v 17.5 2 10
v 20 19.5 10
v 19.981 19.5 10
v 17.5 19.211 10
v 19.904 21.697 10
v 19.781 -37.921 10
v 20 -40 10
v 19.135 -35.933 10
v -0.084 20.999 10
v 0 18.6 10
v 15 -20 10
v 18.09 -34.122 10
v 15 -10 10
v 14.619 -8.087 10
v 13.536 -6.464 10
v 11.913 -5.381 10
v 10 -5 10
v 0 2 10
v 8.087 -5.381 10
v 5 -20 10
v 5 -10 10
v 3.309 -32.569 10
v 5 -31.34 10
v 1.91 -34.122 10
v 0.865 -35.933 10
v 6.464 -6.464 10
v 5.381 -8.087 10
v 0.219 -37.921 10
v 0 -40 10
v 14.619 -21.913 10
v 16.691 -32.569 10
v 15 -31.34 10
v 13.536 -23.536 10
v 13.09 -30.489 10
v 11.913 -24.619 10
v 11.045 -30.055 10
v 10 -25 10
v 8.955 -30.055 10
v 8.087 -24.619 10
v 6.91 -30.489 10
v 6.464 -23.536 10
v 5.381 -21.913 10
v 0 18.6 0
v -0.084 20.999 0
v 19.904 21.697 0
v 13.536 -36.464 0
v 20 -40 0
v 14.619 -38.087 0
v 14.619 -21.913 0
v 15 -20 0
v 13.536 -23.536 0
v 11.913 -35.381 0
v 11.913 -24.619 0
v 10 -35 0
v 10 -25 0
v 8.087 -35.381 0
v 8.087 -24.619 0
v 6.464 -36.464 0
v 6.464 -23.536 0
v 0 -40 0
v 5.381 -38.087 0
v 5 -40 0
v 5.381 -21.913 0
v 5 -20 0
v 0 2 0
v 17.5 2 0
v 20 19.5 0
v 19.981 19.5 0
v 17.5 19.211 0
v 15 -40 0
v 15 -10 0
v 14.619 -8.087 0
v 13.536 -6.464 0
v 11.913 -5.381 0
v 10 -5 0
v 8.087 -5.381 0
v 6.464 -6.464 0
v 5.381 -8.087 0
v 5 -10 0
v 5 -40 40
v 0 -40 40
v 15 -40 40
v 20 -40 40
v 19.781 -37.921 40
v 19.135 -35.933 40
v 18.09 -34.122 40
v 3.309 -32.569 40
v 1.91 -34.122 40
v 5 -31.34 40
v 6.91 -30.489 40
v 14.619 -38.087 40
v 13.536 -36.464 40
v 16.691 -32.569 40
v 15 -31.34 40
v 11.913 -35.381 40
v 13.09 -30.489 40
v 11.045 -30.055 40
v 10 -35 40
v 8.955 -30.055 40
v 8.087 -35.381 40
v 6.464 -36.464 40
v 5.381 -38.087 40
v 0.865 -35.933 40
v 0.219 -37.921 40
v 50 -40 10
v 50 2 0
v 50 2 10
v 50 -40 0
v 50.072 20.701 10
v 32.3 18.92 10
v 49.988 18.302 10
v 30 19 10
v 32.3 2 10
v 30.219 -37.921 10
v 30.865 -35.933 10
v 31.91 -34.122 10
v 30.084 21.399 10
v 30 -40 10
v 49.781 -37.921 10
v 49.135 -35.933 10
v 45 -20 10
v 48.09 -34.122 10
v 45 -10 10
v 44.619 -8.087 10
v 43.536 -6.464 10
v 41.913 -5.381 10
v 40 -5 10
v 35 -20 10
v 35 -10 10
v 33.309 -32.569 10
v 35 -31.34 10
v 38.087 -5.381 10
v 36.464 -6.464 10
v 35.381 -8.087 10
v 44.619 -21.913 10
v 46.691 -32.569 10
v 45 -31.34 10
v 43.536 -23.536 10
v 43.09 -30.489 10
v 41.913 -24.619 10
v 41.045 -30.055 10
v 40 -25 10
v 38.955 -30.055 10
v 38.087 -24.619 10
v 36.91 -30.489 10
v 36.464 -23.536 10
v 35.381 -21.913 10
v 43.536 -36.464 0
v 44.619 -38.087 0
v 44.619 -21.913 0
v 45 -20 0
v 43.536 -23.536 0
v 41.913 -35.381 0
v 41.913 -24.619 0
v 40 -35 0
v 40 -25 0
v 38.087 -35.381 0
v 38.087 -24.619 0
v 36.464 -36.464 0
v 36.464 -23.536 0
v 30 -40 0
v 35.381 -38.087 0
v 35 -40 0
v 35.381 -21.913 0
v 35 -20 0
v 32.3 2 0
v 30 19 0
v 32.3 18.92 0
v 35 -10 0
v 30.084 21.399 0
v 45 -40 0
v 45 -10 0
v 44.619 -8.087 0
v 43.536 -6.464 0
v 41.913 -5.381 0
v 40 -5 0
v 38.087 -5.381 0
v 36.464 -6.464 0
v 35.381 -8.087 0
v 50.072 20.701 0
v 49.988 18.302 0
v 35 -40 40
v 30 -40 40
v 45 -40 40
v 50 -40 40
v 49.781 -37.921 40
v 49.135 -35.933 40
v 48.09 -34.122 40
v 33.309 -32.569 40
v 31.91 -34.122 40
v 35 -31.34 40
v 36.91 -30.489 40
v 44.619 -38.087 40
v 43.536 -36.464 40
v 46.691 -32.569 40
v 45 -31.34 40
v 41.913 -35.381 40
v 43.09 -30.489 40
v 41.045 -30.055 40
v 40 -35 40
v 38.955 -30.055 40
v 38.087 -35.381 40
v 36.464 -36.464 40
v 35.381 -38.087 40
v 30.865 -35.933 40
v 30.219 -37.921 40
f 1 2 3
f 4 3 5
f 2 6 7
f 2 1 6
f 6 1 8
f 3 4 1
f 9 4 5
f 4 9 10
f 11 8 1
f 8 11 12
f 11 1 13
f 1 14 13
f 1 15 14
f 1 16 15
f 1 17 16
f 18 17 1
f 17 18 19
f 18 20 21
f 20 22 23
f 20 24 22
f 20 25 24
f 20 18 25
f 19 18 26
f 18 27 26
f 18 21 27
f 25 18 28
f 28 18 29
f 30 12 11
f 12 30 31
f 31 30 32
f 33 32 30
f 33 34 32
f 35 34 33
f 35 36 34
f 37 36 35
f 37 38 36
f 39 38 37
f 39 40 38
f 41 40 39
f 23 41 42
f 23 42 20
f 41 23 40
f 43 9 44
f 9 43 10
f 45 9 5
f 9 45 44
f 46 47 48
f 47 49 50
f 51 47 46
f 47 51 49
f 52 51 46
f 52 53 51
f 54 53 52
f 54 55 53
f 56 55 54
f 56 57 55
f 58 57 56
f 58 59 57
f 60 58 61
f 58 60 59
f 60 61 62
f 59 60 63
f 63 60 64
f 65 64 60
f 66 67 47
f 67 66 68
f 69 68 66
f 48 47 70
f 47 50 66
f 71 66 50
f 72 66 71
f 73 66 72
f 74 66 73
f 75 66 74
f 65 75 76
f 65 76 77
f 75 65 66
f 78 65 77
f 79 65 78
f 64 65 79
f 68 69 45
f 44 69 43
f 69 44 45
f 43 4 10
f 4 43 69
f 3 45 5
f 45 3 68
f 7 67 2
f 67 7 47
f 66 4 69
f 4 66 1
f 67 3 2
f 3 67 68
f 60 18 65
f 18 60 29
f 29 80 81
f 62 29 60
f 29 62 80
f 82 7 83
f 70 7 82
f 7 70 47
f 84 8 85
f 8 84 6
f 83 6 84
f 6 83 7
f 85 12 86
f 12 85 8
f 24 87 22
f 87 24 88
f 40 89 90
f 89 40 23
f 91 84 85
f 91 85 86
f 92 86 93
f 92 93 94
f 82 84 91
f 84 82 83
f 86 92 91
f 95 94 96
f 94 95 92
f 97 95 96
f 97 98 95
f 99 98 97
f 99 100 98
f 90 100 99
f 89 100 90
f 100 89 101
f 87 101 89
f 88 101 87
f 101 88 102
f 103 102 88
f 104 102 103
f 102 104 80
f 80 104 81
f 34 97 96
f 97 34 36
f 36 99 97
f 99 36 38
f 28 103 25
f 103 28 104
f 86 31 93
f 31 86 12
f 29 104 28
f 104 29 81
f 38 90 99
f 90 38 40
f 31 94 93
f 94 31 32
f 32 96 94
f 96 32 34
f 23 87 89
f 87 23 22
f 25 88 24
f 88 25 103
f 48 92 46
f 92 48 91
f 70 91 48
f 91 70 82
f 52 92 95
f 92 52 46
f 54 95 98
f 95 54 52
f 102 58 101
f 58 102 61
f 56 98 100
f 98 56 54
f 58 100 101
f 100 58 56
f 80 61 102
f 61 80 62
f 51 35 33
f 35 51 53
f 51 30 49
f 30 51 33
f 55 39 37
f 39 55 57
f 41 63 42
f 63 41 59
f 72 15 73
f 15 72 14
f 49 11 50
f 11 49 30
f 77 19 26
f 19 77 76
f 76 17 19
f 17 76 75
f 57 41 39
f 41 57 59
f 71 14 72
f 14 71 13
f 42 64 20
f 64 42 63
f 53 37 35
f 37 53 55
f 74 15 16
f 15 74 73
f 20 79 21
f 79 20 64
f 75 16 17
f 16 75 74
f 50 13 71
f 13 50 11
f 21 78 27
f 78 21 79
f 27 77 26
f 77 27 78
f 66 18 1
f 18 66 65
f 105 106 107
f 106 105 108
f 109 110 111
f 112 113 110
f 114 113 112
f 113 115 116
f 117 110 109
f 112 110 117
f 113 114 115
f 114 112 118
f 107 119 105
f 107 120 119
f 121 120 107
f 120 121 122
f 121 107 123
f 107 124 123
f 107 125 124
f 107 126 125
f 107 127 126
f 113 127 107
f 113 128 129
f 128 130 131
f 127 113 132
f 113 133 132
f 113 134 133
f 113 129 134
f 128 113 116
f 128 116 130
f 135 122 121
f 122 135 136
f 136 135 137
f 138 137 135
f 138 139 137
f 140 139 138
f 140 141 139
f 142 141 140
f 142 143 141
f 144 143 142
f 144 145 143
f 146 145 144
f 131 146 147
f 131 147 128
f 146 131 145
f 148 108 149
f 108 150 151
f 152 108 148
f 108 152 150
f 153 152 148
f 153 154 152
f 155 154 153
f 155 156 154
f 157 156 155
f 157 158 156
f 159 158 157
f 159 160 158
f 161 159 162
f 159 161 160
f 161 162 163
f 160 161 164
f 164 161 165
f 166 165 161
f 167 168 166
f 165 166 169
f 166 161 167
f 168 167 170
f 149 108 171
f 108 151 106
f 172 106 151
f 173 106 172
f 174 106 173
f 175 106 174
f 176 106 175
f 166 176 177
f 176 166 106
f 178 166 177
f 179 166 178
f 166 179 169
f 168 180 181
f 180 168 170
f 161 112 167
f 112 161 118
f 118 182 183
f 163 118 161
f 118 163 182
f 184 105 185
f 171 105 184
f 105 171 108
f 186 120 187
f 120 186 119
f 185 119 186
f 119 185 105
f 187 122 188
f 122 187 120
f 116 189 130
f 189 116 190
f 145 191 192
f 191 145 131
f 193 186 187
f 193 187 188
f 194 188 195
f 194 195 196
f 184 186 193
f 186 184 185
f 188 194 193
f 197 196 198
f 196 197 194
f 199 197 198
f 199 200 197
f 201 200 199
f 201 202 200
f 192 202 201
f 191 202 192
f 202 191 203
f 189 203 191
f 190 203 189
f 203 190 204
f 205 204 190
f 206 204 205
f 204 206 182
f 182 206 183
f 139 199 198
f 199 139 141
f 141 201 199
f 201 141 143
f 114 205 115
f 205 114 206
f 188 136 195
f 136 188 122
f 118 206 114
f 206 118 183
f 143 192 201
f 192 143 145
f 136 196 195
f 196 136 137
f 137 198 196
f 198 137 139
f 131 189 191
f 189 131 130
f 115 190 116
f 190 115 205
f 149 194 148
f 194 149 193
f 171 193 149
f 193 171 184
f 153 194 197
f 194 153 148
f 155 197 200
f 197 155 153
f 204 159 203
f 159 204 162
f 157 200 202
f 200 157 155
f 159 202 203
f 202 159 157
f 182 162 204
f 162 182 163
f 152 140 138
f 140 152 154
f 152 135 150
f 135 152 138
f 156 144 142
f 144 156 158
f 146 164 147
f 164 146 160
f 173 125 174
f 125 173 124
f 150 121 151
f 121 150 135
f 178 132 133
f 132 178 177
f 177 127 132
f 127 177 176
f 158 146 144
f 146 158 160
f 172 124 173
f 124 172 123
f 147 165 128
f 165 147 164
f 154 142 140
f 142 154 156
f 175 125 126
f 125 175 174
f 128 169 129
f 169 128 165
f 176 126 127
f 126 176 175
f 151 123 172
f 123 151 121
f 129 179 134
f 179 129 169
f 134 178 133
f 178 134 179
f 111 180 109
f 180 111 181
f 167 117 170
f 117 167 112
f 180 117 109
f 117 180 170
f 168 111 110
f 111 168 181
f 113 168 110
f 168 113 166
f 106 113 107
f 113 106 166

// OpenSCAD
/* [Global] */

// width of holder
width = 10;

// inner height of clamp (should be the height of the board you want to attach it to)
clamp_inner_height = 17;

// length of the round part that goes into the roll
roll_holder_length = 30;

holder("right",width,clamp_inner_height,roll_holder_length);
translate([30,0,0]) holder("left",width,clamp_inner_height,roll_holder_length);

module holder(side,width,clamp_inner_height,roll_holder_length){

	if(side == "right"){
		translate([0,clamp_inner_height+1.6,0]) rotate([0,0,2]) cube([20,2.4,width]);
		translate([17.5,0,0]) cube([2.5,clamp_inner_height+2.5,width]);
	}else{
		translate([0,clamp_inner_height+2,0]) rotate([0,0,-2]) cube([20,2.4,width]);
		translate([0,0,0]) cube([2.3,clamp_inner_height+2,width]);
	}
	cube([20,2,width]);
	difference(){
		union(){
			translate([0,-40,0]) cube([20,40,width]);
			translate([10,-40,width]) cylinder(r=10,h=roll_holder_length);
		}
		translate([10,-40,-0.05]) cylinder(r=5,h=roll_holder_length+width+0.1);
		translate([0,-70,-0.05]) cube([30,30,roll_holder_length+width+0.1]);
		hull(){
			translate([10,-10,-0.01]) cylinder(r=5,h=width+0.1);
			translate([10,-20,-0.01]) cylinder(r=5,h=width+0.1);
		}
	}
}
